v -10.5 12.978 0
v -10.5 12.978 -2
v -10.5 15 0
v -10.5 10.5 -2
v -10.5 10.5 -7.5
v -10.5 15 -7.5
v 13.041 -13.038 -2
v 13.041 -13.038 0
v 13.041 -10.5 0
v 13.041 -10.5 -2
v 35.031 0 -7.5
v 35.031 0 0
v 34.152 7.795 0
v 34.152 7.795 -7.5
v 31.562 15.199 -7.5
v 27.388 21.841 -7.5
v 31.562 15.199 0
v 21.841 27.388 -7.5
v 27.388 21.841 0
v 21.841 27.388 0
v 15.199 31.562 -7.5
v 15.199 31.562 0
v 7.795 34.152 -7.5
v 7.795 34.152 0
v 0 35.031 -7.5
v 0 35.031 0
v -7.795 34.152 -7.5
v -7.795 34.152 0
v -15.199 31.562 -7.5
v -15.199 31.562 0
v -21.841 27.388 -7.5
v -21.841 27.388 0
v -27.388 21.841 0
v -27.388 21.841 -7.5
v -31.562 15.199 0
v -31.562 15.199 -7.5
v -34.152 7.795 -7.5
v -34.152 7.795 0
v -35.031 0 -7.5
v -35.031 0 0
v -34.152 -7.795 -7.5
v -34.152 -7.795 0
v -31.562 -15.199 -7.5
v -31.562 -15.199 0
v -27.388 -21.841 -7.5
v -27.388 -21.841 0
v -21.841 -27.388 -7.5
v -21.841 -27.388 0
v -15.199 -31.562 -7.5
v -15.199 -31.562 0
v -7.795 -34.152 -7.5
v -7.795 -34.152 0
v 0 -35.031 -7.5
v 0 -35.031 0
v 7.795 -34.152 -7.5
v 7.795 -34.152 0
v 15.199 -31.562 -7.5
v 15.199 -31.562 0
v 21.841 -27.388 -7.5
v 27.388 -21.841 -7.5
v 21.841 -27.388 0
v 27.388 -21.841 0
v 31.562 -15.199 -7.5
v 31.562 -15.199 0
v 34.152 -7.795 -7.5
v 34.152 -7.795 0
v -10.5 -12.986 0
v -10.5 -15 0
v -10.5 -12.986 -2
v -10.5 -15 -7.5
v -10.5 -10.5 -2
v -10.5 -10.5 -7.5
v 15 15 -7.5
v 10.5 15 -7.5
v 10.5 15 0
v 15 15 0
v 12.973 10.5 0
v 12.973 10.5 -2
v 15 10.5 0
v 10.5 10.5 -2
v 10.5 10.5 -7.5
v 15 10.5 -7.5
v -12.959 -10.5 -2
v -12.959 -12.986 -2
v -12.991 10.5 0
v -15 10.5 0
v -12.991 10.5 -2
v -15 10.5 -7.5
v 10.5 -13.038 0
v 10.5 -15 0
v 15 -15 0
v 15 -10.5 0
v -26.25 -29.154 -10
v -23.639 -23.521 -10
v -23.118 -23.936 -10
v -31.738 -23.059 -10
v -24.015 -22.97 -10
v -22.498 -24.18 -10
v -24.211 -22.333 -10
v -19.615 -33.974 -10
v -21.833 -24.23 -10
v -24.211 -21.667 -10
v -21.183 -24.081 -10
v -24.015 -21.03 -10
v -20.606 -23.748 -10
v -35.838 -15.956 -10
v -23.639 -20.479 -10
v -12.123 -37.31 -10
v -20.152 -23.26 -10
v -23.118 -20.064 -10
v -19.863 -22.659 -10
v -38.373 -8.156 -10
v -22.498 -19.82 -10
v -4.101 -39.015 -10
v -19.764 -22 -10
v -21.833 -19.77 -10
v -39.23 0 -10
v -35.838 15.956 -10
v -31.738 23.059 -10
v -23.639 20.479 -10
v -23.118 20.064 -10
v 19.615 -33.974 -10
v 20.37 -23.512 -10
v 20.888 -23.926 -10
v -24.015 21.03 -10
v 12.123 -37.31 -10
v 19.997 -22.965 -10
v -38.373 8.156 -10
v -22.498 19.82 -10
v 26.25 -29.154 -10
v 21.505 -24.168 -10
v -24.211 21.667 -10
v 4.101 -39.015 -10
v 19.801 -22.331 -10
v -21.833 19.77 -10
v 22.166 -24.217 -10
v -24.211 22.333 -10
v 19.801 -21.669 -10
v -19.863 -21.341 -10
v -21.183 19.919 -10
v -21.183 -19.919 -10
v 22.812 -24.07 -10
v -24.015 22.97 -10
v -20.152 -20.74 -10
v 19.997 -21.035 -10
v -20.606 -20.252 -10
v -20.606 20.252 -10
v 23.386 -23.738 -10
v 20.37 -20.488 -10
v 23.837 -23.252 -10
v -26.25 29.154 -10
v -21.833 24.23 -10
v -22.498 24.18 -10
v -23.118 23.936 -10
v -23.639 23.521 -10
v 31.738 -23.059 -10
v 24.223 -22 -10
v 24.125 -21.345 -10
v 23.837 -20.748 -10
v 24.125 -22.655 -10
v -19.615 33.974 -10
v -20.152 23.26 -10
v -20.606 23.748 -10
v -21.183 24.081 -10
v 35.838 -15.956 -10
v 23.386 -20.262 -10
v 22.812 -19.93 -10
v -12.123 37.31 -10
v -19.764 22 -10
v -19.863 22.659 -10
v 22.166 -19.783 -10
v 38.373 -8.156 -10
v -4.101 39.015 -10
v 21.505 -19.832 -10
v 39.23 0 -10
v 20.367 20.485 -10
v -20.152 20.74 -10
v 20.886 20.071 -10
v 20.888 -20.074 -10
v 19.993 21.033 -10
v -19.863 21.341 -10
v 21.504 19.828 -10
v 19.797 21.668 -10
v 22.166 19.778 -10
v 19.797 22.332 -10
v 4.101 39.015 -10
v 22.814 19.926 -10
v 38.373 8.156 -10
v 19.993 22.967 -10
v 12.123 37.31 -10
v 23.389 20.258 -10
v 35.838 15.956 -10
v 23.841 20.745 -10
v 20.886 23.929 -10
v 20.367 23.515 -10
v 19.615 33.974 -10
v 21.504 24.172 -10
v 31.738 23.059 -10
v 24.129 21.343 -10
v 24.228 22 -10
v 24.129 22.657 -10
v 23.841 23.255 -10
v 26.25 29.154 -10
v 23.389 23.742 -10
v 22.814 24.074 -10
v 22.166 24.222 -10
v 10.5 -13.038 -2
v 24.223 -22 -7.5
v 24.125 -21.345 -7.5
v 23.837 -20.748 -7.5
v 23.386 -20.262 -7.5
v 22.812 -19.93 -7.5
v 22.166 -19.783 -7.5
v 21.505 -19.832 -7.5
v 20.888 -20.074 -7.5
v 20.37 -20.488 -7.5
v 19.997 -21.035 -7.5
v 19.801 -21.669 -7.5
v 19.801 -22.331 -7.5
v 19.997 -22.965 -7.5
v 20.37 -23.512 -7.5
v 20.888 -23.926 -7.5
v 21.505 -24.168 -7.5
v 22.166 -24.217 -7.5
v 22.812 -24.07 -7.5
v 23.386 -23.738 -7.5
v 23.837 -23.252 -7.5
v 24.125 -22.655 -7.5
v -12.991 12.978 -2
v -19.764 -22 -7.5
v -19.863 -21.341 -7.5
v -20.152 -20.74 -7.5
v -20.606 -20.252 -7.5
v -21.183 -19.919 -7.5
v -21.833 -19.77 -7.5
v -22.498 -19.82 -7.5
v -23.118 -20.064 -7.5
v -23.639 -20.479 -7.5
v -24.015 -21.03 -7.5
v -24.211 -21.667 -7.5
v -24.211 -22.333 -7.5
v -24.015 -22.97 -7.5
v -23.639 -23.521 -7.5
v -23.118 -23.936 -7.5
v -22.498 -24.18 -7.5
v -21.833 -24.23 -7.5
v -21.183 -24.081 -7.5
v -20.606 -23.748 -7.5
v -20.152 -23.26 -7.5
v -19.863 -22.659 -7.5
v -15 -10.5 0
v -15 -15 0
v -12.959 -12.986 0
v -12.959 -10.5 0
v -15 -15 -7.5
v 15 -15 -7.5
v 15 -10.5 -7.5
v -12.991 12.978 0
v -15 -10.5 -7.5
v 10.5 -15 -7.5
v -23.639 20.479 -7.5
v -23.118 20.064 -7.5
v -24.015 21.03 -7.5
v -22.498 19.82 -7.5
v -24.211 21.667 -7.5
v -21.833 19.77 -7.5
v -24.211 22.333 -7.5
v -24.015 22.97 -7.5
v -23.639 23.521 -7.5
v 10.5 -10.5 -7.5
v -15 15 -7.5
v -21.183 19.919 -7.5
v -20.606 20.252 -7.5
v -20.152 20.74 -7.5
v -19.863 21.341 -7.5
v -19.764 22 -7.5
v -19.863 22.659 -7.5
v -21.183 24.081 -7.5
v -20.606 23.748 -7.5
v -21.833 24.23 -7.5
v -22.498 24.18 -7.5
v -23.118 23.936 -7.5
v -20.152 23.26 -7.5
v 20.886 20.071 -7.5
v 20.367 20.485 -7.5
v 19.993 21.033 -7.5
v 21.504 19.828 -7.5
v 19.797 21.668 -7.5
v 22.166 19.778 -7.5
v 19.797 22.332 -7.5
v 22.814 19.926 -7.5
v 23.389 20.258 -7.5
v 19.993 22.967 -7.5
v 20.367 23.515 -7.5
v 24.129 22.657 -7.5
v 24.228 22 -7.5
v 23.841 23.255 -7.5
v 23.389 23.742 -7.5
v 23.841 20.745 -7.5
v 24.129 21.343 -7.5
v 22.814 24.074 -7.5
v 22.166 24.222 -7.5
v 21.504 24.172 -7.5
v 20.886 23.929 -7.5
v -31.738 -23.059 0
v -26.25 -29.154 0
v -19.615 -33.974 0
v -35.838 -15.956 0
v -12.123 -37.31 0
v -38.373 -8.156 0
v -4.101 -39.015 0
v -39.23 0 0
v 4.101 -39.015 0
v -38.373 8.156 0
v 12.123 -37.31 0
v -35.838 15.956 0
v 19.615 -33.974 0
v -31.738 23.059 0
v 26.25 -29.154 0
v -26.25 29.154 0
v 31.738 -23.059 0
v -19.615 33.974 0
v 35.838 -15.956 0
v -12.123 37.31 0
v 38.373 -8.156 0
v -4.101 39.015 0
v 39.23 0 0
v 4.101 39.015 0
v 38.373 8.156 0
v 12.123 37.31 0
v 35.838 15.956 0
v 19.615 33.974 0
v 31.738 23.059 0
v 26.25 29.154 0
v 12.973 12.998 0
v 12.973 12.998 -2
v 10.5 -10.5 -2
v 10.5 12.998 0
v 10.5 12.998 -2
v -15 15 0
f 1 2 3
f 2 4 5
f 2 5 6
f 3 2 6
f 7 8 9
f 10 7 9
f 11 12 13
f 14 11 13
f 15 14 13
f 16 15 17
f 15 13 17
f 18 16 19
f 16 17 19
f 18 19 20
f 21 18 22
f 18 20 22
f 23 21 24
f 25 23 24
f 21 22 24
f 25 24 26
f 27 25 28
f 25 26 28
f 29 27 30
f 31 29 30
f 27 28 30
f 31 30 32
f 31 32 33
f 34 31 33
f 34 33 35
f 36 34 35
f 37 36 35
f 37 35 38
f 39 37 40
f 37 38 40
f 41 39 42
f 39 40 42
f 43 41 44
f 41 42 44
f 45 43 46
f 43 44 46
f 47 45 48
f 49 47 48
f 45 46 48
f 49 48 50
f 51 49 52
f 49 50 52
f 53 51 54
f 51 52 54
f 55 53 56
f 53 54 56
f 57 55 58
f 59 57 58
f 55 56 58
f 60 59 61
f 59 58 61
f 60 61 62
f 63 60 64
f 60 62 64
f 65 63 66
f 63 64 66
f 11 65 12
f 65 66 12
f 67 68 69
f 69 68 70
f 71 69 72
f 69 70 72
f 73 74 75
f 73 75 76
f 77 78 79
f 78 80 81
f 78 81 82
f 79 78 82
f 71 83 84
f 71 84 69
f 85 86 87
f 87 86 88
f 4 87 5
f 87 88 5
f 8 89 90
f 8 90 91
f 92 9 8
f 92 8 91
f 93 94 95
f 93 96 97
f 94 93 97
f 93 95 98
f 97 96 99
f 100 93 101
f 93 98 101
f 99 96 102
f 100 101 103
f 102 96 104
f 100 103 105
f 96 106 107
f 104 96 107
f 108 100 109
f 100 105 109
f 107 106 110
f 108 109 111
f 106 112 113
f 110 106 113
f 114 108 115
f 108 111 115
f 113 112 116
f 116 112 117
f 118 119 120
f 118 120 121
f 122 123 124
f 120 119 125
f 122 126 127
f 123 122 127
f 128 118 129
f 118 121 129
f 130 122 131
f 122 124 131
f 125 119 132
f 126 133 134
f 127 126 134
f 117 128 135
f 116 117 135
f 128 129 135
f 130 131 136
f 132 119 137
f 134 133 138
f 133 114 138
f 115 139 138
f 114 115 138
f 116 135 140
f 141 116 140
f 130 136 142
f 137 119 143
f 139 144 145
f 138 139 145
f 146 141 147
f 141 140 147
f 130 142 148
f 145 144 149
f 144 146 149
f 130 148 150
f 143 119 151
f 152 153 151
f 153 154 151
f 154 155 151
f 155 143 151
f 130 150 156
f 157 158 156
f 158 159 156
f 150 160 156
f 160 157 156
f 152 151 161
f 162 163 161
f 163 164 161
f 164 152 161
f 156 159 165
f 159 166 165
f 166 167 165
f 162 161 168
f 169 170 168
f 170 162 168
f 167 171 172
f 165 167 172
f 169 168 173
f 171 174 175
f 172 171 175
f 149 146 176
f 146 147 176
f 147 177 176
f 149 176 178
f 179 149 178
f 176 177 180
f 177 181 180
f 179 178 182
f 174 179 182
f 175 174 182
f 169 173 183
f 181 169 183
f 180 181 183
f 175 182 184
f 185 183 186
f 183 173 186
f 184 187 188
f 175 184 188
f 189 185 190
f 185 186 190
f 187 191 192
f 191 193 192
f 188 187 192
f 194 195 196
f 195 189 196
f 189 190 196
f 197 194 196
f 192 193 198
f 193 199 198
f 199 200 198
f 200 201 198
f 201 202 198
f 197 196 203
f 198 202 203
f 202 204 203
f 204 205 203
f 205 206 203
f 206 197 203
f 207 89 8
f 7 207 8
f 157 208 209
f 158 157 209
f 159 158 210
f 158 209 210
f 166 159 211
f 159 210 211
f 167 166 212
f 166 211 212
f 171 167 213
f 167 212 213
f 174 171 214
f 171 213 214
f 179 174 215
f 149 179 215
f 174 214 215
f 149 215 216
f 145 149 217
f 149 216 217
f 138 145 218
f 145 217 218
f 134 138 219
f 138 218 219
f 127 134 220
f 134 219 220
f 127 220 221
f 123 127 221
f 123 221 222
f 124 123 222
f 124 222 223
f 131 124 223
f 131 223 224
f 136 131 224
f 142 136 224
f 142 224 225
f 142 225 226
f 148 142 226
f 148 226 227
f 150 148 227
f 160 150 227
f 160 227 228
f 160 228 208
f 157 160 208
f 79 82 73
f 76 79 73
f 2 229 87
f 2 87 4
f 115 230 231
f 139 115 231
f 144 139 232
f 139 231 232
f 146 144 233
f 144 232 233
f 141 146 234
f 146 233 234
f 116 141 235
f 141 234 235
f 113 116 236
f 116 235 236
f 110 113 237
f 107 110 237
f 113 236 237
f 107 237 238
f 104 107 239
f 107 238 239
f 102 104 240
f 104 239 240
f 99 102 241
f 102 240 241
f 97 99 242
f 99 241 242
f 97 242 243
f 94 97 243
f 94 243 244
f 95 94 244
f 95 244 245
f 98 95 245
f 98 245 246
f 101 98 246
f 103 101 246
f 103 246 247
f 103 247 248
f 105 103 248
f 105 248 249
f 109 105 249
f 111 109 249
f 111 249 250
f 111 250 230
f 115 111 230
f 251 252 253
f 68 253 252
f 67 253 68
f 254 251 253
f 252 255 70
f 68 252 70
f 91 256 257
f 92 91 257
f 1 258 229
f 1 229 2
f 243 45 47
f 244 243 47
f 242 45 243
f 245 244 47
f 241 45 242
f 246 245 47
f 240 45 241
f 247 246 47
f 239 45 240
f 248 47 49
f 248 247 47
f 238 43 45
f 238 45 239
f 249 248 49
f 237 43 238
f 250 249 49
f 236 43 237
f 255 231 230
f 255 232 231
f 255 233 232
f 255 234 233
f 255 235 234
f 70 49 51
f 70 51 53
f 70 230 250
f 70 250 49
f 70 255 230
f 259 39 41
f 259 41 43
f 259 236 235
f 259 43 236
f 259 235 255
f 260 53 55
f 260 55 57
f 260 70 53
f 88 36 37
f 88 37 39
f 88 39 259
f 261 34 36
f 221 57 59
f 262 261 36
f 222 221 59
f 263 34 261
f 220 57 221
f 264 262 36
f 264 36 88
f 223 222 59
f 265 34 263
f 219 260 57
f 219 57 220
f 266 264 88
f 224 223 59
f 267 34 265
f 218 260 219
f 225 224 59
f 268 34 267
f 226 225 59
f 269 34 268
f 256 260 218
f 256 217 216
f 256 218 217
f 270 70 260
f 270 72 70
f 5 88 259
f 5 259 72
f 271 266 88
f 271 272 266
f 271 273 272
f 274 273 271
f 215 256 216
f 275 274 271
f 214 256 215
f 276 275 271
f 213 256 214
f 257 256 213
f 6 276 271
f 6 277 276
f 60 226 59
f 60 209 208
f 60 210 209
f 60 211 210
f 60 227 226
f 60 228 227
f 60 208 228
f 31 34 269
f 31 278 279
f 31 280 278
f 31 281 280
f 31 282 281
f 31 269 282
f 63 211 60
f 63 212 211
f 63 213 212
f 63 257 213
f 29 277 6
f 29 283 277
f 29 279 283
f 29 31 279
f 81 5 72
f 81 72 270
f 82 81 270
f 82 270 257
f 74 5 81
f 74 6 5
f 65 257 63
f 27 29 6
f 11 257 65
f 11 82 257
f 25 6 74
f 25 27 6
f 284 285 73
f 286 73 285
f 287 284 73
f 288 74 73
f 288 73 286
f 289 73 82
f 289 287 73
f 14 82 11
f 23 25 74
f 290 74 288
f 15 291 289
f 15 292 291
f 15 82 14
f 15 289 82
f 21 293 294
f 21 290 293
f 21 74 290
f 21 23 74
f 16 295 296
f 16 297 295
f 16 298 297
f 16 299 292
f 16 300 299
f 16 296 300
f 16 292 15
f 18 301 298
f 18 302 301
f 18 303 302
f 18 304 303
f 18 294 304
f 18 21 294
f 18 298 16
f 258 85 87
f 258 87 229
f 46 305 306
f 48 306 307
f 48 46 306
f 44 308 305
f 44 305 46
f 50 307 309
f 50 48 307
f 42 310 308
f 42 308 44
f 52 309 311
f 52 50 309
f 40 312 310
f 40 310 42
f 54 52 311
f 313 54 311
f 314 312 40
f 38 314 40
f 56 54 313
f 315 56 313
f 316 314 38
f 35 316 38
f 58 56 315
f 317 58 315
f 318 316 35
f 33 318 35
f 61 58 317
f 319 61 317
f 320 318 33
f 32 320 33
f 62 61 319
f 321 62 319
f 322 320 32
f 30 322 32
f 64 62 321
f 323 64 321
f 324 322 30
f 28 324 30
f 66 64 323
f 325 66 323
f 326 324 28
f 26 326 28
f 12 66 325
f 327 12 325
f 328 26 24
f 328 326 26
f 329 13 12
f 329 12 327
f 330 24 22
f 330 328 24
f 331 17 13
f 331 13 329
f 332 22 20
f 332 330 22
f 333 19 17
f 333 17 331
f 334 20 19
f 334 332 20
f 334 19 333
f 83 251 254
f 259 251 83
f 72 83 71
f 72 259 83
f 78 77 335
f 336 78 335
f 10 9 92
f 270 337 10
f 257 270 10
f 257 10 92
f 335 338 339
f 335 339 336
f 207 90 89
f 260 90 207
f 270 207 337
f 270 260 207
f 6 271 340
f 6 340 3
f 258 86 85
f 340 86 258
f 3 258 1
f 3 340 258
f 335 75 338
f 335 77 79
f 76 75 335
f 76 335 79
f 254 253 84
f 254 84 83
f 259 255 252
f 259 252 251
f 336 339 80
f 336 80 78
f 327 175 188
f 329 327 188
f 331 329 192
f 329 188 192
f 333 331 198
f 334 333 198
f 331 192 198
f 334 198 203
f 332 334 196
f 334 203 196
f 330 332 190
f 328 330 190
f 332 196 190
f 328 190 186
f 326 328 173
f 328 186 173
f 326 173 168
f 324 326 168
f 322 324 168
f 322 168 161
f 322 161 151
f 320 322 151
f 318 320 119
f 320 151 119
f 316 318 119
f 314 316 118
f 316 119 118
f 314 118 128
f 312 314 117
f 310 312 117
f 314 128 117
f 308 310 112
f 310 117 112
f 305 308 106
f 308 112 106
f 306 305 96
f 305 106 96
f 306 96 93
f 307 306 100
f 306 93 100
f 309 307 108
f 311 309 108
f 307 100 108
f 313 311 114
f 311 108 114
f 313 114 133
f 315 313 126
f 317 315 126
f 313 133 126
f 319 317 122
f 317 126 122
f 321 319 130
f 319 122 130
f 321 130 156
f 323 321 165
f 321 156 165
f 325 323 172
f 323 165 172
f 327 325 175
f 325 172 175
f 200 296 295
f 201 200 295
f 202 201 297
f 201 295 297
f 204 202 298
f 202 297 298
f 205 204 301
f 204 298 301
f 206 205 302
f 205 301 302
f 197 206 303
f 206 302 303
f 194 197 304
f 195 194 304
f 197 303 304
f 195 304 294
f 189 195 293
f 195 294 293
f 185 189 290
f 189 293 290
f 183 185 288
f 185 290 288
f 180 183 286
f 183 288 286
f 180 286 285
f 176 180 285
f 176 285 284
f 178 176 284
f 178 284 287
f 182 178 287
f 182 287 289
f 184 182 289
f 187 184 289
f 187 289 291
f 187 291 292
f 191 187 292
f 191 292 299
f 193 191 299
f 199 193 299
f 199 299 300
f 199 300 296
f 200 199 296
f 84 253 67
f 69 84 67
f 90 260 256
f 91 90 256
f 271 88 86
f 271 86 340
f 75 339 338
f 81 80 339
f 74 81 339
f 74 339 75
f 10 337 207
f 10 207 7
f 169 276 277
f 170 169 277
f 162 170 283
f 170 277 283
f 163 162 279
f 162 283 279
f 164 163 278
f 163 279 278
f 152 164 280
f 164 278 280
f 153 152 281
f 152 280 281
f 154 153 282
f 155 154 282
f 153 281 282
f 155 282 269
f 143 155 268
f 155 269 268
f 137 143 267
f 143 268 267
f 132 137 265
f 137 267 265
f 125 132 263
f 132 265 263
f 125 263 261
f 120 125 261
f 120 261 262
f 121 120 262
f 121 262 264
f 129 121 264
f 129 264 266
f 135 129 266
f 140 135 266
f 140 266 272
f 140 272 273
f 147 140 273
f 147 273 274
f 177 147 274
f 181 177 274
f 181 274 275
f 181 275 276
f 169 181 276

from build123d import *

# Parameters (mm, degrees)
SKETCH006_R     = 39.229987
PAD001_DEPTH    = 10
SKETCH007_R     = 35.030743
POCKET003_DEPTH = 7.5
SKETCH008_R     = 2.223377
SKETCH008_R_2   = 2.22785
SKETCH008_R_3   = 2.236068
POCKET004_DEPTH = 5
SKETCH011_W     = 4.5
SKETCH011_H     = 4.5
PAD002_DEPTH    = 7.5
SKETCH012_W     = 2.831394
SKETCH012_H     = 3.088426
POCKET005_DEPTH = 2
SKETCH013_W     = 2.956726
SKETCH013_H     = 2.855928
POCKET006_DEPTH = 2
SKETCH014_W     = 2.736649
SKETCH014_H     = 2.756396
POCKET007_DEPTH = 2
SKETCH015_W     = 2.695849
SKETCH015_H     = 2.640832
POCKET008_DEPTH = 2


with BuildPart() as part:
    # Sketch006 → Pad001 (new body)
    with BuildSketch(Plane.XY.offset(-10)):
        Circle(SKETCH006_R)
    extrude(amount=PAD001_DEPTH)

    # Sketch007 → Pocket003 (cut)
    with BuildSketch(Plane.XY):
        Circle(SKETCH007_R)
    extrude(amount=-POCKET003_DEPTH, mode=Mode.SUBTRACT)

    # Sketch008 → Pocket004 (cut)
    with BuildSketch(Plane.XY.offset(-7.5)):
        with Locations((22, -22)):
            Circle(SKETCH008_R)
        with Locations((22, 22)):
            Circle(SKETCH008_R_2)
        with Locations((-22, 22)):
            Circle(SKETCH008_R_3)
        with Locations((-22, -22)):
            Circle(SKETCH008_R_3)
    extrude(amount=-POCKET004_DEPTH, mode=Mode.SUBTRACT)

    # Sketch011 → Pad002 (new body)
    with BuildSketch(Plane.XY.offset(-7.5)):
        with Locations((12.75, 12.75)):
            Rectangle(SKETCH011_W, SKETCH011_H)
        with Locations((12.75, -12.75)):
            Rectangle(SKETCH011_W, SKETCH011_H)
        with Locations((-12.75, -12.75)):
            Rectangle(SKETCH011_W, SKETCH011_H)
        with Locations((-12.75, 12.75)):
            Rectangle(SKETCH011_W, SKETCH011_H)
    extrude(amount=PAD002_DEPTH)

    # Sketch012 → Pocket005 (cut)
    with BuildSketch(Plane.XY):
        with Locations((-11.575037, 11.434175)):
            Rectangle(SKETCH012_W, SKETCH012_H)
    extrude(amount=-POCKET005_DEPTH, mode=Mode.SUBTRACT)

    # Sketch013 → Pocket006 (cut)
    with BuildSketch(Plane.XY):
        with Locations((11.494347, 11.570308)):
            Rectangle(SKETCH013_W, SKETCH013_H)
    extrude(amount=-POCKET006_DEPTH, mode=Mode.SUBTRACT)

    # Sketch014 → Pocket007 (cut)
    with BuildSketch(Plane.XY):
        with Locations((11.6727, -11.659363)):
            Rectangle(SKETCH014_W, SKETCH014_H)
    extrude(amount=-POCKET007_DEPTH, mode=Mode.SUBTRACT)

    # Sketch015 → Pocket008 (cut)
    with BuildSketch(Plane.XY):
        with Locations((-11.611325, -11.666073)):
            Rectangle(SKETCH015_W, SKETCH015_H)
    extrude(amount=-POCKET008_DEPTH, mode=Mode.SUBTRACT)


solid = part.part
